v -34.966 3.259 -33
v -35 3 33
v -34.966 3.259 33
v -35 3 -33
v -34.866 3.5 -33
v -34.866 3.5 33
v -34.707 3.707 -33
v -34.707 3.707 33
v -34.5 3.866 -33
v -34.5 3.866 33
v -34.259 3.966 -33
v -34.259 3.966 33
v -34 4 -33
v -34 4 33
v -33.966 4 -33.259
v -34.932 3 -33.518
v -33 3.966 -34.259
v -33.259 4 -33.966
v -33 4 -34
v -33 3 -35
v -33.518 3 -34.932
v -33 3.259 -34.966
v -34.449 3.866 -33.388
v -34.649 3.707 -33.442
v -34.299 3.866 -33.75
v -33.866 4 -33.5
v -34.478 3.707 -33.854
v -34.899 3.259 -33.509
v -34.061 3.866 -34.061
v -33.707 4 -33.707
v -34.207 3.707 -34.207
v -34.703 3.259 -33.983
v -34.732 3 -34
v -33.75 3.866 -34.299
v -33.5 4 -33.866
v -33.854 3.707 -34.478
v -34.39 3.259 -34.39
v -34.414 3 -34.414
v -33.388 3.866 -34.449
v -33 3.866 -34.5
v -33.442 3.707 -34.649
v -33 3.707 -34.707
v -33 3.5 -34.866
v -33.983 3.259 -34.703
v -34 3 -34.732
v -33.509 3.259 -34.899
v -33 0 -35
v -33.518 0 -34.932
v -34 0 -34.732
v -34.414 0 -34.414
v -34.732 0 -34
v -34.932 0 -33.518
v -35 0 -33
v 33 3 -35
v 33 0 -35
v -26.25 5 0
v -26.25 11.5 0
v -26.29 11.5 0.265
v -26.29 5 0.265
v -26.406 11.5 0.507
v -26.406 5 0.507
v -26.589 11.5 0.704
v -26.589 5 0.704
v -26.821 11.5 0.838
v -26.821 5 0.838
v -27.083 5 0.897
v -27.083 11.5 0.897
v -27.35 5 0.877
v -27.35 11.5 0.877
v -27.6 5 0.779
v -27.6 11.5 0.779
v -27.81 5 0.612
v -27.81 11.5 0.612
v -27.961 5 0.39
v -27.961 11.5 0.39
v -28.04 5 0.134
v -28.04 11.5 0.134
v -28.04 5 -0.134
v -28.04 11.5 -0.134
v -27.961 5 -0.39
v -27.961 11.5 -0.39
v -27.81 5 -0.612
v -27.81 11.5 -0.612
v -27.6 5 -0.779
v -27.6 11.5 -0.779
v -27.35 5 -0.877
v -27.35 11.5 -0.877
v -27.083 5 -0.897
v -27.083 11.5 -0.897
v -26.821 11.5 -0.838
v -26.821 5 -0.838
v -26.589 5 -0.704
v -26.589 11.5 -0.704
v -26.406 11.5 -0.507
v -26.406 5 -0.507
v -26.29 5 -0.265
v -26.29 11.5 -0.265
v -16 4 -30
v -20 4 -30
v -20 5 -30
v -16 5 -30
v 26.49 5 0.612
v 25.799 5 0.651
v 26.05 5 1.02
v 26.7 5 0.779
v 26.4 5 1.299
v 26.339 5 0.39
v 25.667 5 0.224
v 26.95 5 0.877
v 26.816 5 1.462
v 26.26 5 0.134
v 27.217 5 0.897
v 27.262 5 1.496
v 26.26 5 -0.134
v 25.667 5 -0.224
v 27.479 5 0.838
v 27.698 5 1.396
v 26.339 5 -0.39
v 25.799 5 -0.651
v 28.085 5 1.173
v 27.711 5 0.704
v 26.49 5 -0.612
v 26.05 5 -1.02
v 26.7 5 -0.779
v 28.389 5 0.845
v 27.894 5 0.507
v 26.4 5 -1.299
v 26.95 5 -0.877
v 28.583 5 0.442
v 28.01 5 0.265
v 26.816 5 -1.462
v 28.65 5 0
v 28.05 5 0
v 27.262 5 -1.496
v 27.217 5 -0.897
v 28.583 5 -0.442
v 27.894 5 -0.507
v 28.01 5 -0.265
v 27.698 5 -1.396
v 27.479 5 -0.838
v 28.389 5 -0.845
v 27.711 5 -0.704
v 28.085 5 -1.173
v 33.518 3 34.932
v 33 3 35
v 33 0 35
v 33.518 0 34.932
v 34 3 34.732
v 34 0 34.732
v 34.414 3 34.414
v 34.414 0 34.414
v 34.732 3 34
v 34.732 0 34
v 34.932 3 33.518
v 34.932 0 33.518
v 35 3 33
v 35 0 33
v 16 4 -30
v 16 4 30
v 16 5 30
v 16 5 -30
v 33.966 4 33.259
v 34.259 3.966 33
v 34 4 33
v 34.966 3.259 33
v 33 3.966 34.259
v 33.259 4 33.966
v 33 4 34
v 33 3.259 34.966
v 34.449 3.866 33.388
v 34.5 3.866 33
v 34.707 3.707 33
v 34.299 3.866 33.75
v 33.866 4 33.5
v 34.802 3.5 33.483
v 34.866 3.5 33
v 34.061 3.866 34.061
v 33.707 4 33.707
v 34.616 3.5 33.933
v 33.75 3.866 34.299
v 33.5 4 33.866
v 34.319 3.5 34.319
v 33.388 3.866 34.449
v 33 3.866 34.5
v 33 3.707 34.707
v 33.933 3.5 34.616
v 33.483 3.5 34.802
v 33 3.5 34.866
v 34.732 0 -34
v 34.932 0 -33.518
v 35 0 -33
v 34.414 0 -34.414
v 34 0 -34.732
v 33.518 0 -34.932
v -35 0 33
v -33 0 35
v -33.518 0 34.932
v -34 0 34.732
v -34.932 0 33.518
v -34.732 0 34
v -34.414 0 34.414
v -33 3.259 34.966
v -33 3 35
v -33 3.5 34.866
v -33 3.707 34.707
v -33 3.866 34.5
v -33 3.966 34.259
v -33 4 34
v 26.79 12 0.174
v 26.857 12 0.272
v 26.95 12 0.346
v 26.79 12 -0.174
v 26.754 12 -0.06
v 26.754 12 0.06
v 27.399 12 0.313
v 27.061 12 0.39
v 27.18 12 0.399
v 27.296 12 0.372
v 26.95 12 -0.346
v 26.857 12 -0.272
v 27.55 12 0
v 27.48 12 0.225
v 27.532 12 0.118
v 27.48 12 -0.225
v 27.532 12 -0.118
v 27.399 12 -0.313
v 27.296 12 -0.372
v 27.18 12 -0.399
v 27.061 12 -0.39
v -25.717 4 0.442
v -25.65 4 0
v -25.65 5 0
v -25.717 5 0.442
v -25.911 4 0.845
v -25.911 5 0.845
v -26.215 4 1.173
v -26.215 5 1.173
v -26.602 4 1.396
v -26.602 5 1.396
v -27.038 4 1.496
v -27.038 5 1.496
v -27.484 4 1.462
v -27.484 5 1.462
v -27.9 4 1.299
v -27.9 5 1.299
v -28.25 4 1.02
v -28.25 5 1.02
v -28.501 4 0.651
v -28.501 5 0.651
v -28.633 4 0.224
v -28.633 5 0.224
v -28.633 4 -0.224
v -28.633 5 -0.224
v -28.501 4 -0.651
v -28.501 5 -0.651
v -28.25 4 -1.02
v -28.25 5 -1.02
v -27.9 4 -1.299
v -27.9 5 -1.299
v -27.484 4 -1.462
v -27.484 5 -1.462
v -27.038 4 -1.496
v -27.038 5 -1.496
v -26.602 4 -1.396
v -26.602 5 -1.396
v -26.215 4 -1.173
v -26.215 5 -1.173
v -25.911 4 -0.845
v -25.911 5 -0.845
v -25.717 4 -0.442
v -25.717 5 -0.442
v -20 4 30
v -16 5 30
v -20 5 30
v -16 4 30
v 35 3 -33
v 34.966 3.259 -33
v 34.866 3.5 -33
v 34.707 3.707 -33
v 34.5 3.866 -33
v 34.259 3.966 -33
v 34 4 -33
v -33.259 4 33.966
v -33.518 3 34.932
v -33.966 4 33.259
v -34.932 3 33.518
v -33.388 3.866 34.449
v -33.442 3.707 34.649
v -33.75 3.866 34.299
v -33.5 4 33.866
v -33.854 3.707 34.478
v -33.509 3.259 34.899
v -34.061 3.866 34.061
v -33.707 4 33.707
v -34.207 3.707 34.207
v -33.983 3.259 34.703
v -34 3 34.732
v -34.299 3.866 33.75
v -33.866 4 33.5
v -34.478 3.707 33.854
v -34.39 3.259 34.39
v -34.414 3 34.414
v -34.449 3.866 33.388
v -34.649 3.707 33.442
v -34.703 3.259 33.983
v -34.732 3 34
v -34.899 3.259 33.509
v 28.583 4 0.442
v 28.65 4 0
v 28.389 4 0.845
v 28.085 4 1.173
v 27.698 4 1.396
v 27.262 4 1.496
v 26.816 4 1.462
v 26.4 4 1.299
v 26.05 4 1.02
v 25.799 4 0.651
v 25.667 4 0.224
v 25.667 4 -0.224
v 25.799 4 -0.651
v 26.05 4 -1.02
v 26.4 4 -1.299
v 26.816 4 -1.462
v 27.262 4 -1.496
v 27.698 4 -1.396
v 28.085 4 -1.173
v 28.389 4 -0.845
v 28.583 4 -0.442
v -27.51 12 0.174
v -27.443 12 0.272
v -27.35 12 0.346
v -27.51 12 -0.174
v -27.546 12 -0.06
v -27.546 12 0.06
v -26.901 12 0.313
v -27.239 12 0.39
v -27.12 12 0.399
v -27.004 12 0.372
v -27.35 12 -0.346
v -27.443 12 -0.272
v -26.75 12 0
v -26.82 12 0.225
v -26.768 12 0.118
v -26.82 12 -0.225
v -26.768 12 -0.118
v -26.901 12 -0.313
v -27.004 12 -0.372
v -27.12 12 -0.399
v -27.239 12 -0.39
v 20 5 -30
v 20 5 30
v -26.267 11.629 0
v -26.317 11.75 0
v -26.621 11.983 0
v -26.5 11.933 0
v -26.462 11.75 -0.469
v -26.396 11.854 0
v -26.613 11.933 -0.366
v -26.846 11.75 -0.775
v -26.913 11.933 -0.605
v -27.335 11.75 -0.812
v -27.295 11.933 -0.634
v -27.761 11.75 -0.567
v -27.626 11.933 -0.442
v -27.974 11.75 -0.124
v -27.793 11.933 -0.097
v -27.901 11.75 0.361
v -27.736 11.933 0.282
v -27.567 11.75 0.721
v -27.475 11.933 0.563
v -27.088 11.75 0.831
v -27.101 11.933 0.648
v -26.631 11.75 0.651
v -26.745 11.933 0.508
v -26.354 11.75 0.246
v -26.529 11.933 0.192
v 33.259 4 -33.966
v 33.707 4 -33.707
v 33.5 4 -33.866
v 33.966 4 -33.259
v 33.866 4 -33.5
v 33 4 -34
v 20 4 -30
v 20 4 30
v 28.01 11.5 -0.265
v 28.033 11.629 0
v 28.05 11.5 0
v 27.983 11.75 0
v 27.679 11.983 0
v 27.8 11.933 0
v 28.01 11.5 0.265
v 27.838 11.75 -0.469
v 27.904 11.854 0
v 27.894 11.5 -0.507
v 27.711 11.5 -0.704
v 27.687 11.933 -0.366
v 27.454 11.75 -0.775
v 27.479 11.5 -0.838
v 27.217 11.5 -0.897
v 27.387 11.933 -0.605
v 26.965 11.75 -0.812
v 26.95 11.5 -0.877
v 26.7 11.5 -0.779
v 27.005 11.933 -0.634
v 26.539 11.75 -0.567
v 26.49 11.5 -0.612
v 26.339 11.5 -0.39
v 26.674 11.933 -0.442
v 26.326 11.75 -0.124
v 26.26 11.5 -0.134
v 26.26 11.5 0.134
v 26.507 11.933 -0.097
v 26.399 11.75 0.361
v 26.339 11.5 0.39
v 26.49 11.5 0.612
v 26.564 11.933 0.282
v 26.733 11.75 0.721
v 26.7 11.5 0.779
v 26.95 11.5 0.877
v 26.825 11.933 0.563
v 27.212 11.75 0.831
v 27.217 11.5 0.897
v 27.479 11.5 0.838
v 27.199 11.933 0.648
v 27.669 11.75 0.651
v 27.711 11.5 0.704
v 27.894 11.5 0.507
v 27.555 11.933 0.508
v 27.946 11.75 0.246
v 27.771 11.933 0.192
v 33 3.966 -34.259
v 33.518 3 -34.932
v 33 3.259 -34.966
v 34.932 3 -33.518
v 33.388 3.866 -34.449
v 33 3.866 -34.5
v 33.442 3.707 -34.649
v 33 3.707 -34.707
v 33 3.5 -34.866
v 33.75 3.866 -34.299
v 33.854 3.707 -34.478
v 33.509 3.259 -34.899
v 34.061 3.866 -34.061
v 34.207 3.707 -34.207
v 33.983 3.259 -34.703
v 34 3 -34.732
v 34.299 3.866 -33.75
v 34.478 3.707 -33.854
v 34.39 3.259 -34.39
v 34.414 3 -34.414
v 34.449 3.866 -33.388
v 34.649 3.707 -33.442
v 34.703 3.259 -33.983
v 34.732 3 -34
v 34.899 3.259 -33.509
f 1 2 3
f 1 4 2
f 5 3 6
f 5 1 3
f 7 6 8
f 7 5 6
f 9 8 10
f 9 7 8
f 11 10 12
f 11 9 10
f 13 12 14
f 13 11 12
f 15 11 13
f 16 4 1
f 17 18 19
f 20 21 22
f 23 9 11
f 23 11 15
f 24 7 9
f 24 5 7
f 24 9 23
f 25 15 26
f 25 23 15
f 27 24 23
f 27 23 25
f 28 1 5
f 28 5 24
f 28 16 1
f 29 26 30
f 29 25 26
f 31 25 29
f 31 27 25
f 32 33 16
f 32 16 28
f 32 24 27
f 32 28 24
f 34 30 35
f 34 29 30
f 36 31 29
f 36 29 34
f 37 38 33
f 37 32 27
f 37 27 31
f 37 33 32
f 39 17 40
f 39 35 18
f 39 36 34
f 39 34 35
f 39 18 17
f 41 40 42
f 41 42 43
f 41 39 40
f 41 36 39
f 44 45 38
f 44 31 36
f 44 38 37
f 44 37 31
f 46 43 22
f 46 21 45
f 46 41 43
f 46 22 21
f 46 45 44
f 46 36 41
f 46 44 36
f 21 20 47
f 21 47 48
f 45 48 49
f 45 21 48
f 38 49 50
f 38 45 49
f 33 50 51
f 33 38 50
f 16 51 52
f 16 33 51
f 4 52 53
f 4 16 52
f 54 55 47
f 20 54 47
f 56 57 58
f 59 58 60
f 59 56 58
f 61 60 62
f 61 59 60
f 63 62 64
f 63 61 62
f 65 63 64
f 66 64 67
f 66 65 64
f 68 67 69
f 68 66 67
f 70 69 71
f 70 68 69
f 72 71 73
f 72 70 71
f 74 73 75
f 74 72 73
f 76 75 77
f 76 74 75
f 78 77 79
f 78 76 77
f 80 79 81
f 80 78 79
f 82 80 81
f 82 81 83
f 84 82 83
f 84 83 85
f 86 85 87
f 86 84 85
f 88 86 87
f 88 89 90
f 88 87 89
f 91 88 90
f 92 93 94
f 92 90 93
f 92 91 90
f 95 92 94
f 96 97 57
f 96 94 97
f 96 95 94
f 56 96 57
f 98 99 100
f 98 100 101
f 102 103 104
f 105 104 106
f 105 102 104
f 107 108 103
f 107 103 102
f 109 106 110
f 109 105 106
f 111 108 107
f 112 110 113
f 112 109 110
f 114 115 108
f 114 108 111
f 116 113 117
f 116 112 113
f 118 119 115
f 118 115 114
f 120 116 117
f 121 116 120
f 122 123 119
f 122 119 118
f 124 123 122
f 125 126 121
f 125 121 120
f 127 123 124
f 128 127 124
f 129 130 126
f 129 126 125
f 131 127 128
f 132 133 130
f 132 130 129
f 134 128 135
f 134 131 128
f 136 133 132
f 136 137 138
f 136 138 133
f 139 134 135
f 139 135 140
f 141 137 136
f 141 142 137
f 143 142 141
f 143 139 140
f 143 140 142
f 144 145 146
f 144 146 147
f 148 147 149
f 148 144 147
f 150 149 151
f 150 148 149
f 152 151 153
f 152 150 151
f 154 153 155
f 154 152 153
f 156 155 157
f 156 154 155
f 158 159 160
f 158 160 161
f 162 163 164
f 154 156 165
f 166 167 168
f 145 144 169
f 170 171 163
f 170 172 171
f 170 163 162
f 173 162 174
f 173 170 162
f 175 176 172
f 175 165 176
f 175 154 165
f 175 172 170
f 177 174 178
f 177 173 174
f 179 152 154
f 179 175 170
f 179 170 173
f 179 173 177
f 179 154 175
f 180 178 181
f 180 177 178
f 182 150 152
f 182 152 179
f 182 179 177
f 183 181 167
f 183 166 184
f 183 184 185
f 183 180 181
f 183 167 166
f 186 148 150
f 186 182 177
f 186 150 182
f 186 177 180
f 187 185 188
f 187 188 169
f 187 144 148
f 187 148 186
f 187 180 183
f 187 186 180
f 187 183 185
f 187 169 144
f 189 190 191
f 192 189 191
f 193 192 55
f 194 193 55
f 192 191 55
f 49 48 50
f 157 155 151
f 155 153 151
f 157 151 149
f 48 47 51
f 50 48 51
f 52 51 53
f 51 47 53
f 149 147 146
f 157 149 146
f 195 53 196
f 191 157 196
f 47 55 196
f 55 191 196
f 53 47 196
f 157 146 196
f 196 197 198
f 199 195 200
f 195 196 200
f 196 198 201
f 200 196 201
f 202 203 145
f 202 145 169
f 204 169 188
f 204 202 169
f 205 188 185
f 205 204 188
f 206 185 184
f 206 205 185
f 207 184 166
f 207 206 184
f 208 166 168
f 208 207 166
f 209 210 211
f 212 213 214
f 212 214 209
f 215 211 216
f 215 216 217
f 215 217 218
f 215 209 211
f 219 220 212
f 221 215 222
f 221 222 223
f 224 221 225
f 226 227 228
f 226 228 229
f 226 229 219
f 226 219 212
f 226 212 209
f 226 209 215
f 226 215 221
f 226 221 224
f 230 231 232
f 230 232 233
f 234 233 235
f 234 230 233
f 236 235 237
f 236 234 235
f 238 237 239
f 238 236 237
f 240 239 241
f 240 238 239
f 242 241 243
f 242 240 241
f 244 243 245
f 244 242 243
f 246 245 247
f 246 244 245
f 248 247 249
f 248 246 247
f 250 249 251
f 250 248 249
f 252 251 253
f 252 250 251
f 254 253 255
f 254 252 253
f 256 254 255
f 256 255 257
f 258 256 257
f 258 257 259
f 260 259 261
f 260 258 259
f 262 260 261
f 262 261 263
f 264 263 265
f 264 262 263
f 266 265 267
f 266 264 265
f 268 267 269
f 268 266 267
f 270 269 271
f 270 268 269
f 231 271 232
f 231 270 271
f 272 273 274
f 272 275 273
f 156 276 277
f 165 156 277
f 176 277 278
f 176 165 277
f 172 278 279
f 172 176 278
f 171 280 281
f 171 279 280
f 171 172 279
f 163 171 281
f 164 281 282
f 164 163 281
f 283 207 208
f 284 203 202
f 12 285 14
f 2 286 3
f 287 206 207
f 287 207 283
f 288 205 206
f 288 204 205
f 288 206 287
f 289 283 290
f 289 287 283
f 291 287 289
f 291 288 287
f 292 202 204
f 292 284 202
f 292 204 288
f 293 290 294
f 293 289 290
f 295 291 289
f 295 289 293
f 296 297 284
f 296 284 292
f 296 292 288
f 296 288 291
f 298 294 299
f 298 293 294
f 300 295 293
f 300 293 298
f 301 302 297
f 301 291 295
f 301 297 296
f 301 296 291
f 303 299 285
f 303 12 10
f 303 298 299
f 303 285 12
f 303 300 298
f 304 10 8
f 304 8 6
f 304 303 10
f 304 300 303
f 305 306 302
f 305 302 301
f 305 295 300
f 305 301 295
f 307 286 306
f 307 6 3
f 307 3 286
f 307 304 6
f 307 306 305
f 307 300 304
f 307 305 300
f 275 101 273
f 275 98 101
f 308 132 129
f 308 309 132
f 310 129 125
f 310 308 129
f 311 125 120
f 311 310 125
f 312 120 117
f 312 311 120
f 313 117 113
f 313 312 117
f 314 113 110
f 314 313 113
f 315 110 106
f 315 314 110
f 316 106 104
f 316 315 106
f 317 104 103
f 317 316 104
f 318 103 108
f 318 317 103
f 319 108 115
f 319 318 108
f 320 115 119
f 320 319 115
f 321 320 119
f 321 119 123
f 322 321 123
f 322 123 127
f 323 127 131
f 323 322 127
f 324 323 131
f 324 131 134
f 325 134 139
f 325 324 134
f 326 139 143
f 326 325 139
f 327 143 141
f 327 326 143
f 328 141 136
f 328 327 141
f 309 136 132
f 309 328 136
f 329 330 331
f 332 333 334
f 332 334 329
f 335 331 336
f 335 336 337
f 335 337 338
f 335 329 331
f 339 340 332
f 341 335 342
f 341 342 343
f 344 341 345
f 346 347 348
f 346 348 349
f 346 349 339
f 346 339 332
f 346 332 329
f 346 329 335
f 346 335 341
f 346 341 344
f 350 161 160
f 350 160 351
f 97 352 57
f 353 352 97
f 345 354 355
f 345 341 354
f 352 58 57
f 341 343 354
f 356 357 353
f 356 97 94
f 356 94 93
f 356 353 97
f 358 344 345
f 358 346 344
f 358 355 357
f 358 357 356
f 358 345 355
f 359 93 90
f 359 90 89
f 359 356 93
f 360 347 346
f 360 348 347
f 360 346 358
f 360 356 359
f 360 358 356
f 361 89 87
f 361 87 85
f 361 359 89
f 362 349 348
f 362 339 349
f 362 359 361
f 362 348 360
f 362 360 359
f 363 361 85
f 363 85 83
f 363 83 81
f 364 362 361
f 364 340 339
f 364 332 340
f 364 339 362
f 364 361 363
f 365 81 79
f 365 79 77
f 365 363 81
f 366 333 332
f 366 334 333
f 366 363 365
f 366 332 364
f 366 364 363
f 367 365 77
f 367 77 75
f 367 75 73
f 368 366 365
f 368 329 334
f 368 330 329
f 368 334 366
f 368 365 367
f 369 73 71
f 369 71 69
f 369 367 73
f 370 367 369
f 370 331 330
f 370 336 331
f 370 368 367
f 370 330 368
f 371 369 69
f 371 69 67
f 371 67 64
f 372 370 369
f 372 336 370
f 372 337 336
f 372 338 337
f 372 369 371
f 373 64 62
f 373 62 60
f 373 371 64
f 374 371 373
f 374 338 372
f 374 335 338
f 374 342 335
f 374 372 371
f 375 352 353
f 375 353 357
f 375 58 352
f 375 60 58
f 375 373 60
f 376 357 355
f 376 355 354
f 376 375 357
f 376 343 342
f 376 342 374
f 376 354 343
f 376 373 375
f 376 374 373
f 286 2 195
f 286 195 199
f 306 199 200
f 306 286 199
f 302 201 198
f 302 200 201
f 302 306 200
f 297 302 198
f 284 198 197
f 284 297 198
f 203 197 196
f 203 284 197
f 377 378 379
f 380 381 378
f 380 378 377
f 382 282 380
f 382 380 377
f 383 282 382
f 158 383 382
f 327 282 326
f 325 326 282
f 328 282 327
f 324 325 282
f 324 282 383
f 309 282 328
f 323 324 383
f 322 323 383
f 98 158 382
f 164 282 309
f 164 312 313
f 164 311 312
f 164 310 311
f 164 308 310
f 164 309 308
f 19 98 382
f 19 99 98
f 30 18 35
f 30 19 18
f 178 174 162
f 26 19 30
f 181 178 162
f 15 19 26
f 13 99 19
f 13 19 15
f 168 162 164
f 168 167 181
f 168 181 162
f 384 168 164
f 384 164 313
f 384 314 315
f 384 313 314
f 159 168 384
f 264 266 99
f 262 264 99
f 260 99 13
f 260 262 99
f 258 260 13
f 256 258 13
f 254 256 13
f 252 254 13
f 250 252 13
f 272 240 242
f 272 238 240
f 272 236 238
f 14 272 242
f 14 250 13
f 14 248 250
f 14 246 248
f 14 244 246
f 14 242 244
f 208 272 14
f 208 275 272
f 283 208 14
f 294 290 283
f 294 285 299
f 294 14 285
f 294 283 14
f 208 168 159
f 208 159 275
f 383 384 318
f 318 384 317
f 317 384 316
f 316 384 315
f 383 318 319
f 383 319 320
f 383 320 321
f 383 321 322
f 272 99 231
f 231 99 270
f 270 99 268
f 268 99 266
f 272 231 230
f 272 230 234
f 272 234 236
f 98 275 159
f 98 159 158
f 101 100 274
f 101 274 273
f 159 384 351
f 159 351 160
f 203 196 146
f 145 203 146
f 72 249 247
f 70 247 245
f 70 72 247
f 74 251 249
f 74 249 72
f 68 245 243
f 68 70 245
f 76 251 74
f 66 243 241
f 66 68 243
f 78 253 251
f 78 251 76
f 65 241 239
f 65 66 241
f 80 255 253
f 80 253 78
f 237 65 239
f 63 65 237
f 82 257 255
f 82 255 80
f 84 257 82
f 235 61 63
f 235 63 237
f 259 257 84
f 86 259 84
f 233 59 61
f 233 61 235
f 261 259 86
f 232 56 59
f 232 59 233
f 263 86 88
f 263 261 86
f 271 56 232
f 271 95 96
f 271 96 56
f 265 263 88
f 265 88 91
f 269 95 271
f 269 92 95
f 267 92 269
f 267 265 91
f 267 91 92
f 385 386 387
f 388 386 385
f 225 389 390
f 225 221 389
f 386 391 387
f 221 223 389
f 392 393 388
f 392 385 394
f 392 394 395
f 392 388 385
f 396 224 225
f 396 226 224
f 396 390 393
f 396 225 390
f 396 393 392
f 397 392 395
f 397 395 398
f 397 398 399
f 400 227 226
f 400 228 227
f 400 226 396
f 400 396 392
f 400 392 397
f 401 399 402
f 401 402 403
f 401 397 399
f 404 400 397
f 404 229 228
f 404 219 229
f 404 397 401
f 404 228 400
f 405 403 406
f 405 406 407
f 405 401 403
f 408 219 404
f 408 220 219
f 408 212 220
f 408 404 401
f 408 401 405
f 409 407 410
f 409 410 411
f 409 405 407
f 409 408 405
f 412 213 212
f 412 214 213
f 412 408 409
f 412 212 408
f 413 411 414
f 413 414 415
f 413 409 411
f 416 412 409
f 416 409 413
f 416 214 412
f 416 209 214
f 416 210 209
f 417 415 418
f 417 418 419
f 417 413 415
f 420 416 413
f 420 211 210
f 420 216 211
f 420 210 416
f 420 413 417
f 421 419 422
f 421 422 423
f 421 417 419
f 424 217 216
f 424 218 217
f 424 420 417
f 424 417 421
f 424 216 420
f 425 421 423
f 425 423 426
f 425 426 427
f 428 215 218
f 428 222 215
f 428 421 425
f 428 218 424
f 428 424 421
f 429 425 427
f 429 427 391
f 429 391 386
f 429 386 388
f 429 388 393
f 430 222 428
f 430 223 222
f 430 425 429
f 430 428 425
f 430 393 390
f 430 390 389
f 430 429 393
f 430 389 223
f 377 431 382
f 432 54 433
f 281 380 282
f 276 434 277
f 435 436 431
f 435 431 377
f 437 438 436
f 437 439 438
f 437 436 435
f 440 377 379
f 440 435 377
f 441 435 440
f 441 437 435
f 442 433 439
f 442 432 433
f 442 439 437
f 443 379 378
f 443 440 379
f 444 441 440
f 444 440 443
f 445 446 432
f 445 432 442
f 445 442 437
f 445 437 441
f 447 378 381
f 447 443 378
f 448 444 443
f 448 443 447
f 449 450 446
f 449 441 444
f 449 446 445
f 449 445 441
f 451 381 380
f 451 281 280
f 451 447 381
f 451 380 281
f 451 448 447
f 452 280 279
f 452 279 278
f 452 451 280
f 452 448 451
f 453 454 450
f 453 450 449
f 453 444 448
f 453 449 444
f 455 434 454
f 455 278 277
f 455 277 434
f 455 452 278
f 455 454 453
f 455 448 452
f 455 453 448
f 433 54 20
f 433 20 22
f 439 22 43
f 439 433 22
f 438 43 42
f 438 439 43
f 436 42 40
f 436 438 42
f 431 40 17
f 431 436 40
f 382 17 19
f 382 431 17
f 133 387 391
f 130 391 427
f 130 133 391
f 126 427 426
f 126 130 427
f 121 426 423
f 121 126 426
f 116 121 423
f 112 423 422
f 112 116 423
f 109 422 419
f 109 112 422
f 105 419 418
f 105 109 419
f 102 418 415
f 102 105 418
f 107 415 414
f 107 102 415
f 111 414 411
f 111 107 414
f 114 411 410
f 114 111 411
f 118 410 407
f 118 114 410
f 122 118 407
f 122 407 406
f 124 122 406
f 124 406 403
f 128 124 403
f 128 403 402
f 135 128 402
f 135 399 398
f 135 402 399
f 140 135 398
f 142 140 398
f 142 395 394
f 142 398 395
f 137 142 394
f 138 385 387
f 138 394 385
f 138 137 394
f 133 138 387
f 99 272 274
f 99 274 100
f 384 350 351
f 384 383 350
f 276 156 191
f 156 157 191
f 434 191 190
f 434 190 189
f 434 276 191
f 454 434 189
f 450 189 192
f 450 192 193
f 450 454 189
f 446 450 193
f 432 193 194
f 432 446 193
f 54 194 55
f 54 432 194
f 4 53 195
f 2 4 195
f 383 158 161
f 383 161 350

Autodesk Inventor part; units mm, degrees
ref_plane "YZ Plane" through (0, 0, 0) normal (1, 0, 0) x (0, 1, 0)
ref_plane "XZ Plane" through (0, 0, 0) normal (0, 1, 0) x (-1, 0, 0)
ref_plane "XY Plane" through (0, 0, 0) normal (0, 0, 1) x (1, 0, 0)
sketch "Sketch1" plane through (0, 0, 0) normal (0, 1, 0) x (-1, 0, 0)
  line L0 (-35, -35) -> (35, -35)
  line L1 (35, -35) -> (35, 35)
  line L2 (35, 35) -> (-35, 35)
  line L3 (-35, 35) -> (-35, -35)
  line L4 (-35, -35) -> (35, 35) construction
  line L5 (35, -35) -> (-35, 35) construction
  point P0 (0, 0)
  dimension "d0" = 70
  dimension "d1" = 70
extrude "Extrusion1" add sketch "Sketch1" along normal blind 4
sketch "Sketch2" plane through (0, 4, 0) normal (0, 1, 0) x (1, 0, 0)
  circle A0 centre (-27.15, 0) radius 0.9
  circle A1 centre (27.15, 0) radius 0.9
  point P0 (0, 0)
  dimension "d4" = 1.8
  dimension "d5" = 1.8
  dimension "d6" = 54.3
  dimension "d7" = 27.15
extrude "Extrusion2" add sketch "Sketch2" along normal blind 8
fillet "Fillet1" radius 2 4 edges at (35, 2, 35) (-35, 2, 35) (-35, 2, -35) (35, 2, -35)
fillet "Fillet2" radius 0.5 2 edges at (26.25, 12, 0) (-28.05, 12, 0)
sketch "Sketch3" plane through (0, 4, 0) normal (0, 1, 0) x (1, 0, 0)
  circle A0 centre (27.15, 0) radius 0.9 projected
  circle A1 centre (27.15, 0) radius 1.5
  circle A2 centre (-27.15, 0) radius 0.9 projected
  circle A3 centre (-27.15, 0) radius 1.5
  line L0 (-16, -30) -> (-20, -30)
  line L1 (-20, -30) -> (-20, 30)
  line L2 (-20, 30) -> (-16, 30)
  line L3 (-16, 30) -> (-16, -30)
  line L4 (-16, -30) -> (-20, 30) construction
  line L5 (-20, -30) -> (-16, 30) construction
  line L6 (20, -30) -> (16, -30)
  line L7 (16, -30) -> (16, 30)
  line L8 (16, 30) -> (20, 30)
  line L9 (20, 30) -> (20, -30)
  line L10 (20, -30) -> (16, 30) construction
  line L11 (16, -30) -> (20, 30) construction
  point P0 (0, 0)
  point P1 (-18, 0)
  point P2 (18, 0)
  dimension "d12" = 18
  dimension "d13" = 60
  dimension "d14" = 60
  dimension "d15" = 18
  dimension "d16" = 4
  dimension "d17" = 4
  dimension "d18" = 3
  dimension "d19" = 3
extrude "Extrusion3" add sketch "Sketch3" along normal blind 1 contours A0 | A1 | A2 | A3 | L0 L1 L2 L3 | L6 L7 L8 L9
fillet "Fillet3" radius 1 8 edges at (34.4142, 4, 34.4142) (35, 4, 0) (34.4142, 4, -34.4142) (0, 4, -35) (-34.4142, 4, -34.4142) (-35, 4, 0) (-34.4142, 4, 34.4142) (0, 4, 35)
equation "\"d5\" = d4"
equation "\"d7\" = 0.5 * d6"
equation "\"d14\" = d13"
equation "\"d15\" = d12"
equation "\"d17\" = d16"
equation "\"d19\" = d18"
properties part number "Installation Base"
